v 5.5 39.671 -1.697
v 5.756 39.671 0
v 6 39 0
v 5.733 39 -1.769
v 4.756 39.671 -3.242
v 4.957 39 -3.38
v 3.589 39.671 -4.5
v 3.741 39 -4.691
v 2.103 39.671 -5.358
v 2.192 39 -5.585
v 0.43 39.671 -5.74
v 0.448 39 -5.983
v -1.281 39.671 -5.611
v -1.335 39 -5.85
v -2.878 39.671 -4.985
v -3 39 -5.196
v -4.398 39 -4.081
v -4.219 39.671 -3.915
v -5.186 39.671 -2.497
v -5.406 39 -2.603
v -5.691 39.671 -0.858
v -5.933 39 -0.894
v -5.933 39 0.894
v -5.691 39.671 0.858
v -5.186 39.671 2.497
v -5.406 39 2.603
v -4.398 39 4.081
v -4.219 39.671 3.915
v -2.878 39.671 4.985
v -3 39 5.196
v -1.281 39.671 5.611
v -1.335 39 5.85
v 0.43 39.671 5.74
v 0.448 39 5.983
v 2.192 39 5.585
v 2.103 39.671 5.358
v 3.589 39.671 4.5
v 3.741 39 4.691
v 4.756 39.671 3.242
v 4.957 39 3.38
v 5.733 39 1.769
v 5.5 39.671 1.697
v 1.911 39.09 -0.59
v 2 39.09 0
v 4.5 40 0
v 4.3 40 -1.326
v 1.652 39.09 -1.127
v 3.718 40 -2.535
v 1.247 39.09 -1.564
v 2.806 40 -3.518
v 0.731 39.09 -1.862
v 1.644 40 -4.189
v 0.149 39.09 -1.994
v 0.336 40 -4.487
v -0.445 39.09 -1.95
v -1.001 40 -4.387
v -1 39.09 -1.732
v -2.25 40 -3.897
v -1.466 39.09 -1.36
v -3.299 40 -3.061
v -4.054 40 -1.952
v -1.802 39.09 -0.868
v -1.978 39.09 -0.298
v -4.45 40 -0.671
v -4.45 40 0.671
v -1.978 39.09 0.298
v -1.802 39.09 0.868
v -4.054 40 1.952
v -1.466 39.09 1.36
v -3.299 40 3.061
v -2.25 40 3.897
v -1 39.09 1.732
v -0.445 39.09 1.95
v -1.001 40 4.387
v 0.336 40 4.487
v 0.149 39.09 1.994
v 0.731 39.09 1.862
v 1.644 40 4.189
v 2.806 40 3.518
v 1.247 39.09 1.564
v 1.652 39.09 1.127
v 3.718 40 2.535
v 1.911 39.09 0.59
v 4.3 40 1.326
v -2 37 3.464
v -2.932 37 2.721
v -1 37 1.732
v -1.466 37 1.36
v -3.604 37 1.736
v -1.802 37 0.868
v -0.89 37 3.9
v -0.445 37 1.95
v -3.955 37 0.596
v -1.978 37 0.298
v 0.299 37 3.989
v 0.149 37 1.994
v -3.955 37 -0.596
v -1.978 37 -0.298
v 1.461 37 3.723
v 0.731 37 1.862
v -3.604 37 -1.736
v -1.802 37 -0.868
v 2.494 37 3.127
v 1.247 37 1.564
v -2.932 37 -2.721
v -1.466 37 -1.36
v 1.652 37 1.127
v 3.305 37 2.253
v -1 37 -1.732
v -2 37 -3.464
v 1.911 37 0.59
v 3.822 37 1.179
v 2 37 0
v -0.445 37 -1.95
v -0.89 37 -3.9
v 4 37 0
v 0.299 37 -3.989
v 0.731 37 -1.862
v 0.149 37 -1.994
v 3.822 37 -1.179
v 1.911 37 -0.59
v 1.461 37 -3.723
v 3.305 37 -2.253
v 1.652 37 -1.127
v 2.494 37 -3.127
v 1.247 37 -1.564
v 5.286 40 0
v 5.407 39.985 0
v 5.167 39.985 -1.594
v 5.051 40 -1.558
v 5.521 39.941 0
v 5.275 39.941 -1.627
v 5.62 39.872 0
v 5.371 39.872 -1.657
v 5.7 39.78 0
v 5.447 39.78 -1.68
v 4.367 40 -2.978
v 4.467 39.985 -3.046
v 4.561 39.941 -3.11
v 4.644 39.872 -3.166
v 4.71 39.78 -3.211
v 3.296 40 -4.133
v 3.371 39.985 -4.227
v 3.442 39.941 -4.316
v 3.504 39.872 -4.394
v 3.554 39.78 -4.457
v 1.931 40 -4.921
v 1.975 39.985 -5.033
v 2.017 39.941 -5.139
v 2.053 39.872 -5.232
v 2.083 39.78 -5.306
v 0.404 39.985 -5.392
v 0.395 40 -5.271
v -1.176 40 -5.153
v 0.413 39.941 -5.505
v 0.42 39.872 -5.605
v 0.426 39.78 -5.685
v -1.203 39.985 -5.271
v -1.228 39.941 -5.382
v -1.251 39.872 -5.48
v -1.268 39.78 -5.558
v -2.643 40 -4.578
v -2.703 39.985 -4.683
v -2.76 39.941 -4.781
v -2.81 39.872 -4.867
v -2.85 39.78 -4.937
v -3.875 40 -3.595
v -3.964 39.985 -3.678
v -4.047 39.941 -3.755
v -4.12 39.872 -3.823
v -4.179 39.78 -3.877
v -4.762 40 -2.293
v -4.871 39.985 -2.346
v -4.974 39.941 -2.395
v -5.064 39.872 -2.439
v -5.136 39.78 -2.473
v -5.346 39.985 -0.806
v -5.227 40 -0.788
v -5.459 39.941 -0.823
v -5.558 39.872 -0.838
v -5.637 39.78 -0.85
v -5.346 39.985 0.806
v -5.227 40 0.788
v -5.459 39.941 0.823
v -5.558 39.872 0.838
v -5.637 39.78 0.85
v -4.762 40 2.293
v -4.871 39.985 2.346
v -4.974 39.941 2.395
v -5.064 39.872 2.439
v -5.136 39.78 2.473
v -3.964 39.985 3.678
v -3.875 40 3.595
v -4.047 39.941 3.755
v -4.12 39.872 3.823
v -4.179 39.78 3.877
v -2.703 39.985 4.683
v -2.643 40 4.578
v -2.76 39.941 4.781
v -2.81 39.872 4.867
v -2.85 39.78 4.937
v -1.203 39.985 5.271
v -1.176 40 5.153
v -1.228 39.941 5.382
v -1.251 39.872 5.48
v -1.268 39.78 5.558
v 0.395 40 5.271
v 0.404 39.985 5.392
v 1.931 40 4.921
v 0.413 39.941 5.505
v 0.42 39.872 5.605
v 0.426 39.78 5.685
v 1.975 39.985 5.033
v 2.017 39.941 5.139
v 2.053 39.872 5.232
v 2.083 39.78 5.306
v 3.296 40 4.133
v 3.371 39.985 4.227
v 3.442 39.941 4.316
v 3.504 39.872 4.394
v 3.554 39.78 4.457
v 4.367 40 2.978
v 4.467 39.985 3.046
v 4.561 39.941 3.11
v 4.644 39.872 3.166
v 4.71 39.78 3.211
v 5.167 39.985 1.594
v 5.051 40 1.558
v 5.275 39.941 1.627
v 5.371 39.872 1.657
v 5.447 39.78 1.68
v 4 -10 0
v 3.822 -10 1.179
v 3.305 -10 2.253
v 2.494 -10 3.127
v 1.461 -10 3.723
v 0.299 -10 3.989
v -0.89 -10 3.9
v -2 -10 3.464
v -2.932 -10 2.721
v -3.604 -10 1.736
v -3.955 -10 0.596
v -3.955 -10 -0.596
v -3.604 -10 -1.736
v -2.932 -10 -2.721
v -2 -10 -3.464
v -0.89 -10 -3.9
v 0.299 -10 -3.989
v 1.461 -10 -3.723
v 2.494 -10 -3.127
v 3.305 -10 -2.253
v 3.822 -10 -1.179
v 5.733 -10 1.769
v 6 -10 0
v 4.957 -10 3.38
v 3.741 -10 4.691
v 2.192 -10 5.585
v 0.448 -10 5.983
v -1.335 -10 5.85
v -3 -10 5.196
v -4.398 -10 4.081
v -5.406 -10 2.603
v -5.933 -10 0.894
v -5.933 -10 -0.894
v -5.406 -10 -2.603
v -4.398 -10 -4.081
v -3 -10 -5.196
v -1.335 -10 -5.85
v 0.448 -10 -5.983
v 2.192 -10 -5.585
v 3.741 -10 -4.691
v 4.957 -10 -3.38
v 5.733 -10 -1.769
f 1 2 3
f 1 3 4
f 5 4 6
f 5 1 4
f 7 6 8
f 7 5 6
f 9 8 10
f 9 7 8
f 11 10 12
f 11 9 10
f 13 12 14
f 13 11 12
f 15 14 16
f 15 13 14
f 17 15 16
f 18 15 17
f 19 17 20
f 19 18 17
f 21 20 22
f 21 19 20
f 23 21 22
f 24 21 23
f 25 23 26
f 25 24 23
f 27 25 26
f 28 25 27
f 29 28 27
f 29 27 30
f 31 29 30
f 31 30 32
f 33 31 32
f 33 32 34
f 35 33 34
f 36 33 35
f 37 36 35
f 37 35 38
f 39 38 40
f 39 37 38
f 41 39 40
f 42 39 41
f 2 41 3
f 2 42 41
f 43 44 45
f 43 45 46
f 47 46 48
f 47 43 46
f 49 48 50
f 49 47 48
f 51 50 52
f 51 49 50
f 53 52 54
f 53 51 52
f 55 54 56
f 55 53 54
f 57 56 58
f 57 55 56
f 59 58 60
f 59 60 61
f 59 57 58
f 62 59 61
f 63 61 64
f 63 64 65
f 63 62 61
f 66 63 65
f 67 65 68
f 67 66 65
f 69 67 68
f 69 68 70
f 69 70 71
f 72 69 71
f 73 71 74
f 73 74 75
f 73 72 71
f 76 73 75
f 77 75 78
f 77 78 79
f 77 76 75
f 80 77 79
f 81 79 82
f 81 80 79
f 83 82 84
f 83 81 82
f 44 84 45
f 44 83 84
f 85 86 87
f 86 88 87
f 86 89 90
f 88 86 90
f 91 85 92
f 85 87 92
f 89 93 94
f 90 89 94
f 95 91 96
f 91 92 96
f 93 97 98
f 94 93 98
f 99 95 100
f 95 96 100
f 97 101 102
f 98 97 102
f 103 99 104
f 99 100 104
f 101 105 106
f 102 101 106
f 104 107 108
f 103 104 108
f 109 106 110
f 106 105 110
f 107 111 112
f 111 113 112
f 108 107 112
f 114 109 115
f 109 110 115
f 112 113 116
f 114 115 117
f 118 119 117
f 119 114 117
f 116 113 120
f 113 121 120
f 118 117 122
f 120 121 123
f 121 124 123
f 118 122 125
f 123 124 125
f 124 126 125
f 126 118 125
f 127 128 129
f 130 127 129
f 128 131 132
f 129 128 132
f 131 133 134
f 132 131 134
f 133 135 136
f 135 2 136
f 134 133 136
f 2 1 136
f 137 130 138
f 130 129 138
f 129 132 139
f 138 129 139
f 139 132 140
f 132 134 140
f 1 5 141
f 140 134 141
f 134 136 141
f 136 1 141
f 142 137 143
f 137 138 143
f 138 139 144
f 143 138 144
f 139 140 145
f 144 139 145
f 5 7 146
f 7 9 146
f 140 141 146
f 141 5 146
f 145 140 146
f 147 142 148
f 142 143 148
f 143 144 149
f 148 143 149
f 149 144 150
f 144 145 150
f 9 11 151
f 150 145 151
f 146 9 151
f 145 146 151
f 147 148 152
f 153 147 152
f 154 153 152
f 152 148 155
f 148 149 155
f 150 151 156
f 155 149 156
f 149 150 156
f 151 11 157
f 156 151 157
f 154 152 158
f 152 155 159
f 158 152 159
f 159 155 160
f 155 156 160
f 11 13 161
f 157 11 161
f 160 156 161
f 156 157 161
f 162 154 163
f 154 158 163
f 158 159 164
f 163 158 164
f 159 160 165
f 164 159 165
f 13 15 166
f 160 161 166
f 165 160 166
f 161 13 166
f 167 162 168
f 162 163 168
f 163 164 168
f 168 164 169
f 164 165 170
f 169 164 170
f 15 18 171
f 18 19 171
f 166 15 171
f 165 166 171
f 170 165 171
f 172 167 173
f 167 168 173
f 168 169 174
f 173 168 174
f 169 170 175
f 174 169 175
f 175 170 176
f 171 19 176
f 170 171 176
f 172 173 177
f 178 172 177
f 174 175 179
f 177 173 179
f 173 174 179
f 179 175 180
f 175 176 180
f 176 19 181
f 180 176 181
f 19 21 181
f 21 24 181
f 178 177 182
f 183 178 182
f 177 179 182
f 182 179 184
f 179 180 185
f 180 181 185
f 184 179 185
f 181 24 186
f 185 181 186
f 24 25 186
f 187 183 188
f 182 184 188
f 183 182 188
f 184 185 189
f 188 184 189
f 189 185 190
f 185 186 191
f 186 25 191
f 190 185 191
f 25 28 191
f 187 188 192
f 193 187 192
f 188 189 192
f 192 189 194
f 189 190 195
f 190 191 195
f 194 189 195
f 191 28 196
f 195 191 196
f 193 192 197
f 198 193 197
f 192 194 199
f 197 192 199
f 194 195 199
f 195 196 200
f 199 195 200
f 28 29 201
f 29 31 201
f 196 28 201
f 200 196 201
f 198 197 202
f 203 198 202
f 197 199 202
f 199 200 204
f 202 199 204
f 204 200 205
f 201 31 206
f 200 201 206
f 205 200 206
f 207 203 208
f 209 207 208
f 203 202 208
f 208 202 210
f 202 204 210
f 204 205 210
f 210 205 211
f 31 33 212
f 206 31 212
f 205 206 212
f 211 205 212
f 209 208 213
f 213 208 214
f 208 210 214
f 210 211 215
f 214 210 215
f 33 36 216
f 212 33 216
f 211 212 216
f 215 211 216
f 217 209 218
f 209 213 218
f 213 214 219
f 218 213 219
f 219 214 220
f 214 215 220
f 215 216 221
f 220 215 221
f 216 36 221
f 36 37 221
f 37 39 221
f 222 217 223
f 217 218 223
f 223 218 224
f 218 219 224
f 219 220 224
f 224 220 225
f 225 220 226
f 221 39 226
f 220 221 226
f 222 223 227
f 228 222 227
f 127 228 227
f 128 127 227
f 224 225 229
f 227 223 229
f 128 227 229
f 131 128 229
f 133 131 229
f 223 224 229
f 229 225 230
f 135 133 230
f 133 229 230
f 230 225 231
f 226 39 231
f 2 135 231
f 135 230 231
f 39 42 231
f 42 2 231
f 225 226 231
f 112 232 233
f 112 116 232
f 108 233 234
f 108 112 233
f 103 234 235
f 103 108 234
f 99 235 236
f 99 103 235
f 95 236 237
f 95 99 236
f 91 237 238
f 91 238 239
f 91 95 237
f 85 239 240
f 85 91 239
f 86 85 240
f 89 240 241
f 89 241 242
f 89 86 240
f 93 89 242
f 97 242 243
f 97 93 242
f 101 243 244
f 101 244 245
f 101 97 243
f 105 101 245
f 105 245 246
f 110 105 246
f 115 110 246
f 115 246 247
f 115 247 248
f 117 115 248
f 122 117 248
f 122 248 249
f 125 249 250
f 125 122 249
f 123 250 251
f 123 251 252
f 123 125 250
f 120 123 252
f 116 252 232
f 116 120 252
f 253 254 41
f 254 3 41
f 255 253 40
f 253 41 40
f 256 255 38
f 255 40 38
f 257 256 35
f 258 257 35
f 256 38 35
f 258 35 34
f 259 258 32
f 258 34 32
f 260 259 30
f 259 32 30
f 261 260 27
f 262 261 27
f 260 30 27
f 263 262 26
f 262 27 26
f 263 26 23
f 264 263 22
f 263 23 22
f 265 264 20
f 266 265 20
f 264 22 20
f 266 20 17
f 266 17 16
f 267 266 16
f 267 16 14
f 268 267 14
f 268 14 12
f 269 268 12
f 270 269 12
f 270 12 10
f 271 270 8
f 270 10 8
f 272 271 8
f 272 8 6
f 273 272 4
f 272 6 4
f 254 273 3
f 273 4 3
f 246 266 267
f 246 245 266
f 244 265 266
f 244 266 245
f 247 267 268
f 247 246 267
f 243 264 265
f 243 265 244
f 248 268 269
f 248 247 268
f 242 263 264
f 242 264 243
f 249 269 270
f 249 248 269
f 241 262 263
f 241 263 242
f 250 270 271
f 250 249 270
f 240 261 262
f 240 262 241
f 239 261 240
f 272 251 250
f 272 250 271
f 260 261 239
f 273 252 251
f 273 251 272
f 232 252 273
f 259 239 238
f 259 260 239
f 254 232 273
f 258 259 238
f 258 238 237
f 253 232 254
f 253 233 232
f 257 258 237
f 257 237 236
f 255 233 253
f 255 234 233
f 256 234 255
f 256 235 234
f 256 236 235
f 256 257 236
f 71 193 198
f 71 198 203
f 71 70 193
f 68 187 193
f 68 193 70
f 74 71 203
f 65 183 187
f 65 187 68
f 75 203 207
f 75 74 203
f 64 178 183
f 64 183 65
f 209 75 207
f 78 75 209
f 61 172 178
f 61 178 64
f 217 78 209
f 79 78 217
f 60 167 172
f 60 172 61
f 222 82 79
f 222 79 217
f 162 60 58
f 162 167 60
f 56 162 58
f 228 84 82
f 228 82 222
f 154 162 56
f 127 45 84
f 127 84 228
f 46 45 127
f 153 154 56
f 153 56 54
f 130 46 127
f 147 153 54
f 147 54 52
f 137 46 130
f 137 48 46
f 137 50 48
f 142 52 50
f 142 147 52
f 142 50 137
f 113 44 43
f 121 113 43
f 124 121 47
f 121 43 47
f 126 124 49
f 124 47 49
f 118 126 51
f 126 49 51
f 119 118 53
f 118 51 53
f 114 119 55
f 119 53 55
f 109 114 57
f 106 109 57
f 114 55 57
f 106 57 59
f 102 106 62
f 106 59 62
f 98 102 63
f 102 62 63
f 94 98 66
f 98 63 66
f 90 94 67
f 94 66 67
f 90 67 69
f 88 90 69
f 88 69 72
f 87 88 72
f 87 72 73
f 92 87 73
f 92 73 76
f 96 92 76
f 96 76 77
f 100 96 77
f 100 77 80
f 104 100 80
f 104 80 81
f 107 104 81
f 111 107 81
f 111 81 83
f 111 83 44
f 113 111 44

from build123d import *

# Parameters (mm, degrees)
CROQUIS1_R              = 6
CROQUIS1_R_2            = 4
SALIENTE_EXTRUIR1_DEPTH = 40
CROQUIS2_R              = 4
SALIENTE_EXTRUIR2_DEPTH = 3
CROQUIS3_R              = 2
CORTAR_EXTRUIR1_DEPTH   = 40
CHAFL_N1_SIZE           = 2.5
CHAFL_N1_SIZE2          = 0.909925586
CHAFL_N2_SIZE           = 1
CHAFL_N2_SIZE2          = 0.363970234
REDONDEO1_R             = 0.5
CROQUIS4_R              = 6
CROQUIS4_R_2            = 4
SALIENTE_EXTRUIR3_DEPTH = 10


with BuildPart() as part:
    # Croquis1 → Saliente-Extruir1 (new body)
    with BuildSketch(Plane(origin=(0, 0, 0), x_dir=(1, 0, 0), z_dir=(0, 1, 0))):
        Circle(CROQUIS1_R)
        Circle(CROQUIS1_R_2, mode=Mode.SUBTRACT)
    extrude(amount=SALIENTE_EXTRUIR1_DEPTH)

    # Croquis2 → Saliente-Extruir2 (add)
    with BuildSketch(Plane(origin=(0, 37, 0), x_dir=(1, 0, 0), z_dir=(0, 1, 0))):
        Circle(CROQUIS2_R)
    extrude(amount=SALIENTE_EXTRUIR2_DEPTH)

    # Croquis3 → Cortar-Extruir1 (cut)
    with BuildSketch(Plane(origin=(0, 40, 0), x_dir=(1, 0, 0), z_dir=(0, 1, 0))):
        Circle(CROQUIS3_R)
    extrude(amount=-CORTAR_EXTRUIR1_DEPTH, mode=Mode.SUBTRACT)

    # Chaflán1
    chafl_n1_edges = [part.edges().sort_by_distance(p)[0] for p in [
        (-2, 40, 0),
    ]]
    chafl_n1_side = [part.faces().sort_by_distance(p)[0] for p in [
        (-5.830294373, 40, 0),
    ]]
    chamfer(chafl_n1_edges, length=CHAFL_N1_SIZE, length2=CHAFL_N1_SIZE2, reference=chafl_n1_side[0])

    # Chaflán2
    chafl_n2_edges = [part.edges().sort_by_distance(p)[0] for p in [
        (-6, 40, 0),
    ]]
    chafl_n2_side = [part.faces().sort_by_distance(p)[0] for p in [
        (-6, 20, 0),
    ]]
    chamfer(chafl_n2_edges, length=CHAFL_N2_SIZE, length2=CHAFL_N2_SIZE2, reference=chafl_n2_side[0])

    # Redondeo1
    redondeo1_edges = [part.edges().sort_by_distance(p)[0] for p in [
        (-5.636029766, 40, 0),
    ]]
    fillet(redondeo1_edges, radius=REDONDEO1_R)

    # Croquis4 → Saliente-Extruir3 (add)
    with BuildSketch(Plane.XZ):
        Circle(CROQUIS4_R)
        Circle(CROQUIS4_R_2, mode=Mode.SUBTRACT)
    extrude(amount=SALIENTE_EXTRUIR3_DEPTH)


solid = part.part
